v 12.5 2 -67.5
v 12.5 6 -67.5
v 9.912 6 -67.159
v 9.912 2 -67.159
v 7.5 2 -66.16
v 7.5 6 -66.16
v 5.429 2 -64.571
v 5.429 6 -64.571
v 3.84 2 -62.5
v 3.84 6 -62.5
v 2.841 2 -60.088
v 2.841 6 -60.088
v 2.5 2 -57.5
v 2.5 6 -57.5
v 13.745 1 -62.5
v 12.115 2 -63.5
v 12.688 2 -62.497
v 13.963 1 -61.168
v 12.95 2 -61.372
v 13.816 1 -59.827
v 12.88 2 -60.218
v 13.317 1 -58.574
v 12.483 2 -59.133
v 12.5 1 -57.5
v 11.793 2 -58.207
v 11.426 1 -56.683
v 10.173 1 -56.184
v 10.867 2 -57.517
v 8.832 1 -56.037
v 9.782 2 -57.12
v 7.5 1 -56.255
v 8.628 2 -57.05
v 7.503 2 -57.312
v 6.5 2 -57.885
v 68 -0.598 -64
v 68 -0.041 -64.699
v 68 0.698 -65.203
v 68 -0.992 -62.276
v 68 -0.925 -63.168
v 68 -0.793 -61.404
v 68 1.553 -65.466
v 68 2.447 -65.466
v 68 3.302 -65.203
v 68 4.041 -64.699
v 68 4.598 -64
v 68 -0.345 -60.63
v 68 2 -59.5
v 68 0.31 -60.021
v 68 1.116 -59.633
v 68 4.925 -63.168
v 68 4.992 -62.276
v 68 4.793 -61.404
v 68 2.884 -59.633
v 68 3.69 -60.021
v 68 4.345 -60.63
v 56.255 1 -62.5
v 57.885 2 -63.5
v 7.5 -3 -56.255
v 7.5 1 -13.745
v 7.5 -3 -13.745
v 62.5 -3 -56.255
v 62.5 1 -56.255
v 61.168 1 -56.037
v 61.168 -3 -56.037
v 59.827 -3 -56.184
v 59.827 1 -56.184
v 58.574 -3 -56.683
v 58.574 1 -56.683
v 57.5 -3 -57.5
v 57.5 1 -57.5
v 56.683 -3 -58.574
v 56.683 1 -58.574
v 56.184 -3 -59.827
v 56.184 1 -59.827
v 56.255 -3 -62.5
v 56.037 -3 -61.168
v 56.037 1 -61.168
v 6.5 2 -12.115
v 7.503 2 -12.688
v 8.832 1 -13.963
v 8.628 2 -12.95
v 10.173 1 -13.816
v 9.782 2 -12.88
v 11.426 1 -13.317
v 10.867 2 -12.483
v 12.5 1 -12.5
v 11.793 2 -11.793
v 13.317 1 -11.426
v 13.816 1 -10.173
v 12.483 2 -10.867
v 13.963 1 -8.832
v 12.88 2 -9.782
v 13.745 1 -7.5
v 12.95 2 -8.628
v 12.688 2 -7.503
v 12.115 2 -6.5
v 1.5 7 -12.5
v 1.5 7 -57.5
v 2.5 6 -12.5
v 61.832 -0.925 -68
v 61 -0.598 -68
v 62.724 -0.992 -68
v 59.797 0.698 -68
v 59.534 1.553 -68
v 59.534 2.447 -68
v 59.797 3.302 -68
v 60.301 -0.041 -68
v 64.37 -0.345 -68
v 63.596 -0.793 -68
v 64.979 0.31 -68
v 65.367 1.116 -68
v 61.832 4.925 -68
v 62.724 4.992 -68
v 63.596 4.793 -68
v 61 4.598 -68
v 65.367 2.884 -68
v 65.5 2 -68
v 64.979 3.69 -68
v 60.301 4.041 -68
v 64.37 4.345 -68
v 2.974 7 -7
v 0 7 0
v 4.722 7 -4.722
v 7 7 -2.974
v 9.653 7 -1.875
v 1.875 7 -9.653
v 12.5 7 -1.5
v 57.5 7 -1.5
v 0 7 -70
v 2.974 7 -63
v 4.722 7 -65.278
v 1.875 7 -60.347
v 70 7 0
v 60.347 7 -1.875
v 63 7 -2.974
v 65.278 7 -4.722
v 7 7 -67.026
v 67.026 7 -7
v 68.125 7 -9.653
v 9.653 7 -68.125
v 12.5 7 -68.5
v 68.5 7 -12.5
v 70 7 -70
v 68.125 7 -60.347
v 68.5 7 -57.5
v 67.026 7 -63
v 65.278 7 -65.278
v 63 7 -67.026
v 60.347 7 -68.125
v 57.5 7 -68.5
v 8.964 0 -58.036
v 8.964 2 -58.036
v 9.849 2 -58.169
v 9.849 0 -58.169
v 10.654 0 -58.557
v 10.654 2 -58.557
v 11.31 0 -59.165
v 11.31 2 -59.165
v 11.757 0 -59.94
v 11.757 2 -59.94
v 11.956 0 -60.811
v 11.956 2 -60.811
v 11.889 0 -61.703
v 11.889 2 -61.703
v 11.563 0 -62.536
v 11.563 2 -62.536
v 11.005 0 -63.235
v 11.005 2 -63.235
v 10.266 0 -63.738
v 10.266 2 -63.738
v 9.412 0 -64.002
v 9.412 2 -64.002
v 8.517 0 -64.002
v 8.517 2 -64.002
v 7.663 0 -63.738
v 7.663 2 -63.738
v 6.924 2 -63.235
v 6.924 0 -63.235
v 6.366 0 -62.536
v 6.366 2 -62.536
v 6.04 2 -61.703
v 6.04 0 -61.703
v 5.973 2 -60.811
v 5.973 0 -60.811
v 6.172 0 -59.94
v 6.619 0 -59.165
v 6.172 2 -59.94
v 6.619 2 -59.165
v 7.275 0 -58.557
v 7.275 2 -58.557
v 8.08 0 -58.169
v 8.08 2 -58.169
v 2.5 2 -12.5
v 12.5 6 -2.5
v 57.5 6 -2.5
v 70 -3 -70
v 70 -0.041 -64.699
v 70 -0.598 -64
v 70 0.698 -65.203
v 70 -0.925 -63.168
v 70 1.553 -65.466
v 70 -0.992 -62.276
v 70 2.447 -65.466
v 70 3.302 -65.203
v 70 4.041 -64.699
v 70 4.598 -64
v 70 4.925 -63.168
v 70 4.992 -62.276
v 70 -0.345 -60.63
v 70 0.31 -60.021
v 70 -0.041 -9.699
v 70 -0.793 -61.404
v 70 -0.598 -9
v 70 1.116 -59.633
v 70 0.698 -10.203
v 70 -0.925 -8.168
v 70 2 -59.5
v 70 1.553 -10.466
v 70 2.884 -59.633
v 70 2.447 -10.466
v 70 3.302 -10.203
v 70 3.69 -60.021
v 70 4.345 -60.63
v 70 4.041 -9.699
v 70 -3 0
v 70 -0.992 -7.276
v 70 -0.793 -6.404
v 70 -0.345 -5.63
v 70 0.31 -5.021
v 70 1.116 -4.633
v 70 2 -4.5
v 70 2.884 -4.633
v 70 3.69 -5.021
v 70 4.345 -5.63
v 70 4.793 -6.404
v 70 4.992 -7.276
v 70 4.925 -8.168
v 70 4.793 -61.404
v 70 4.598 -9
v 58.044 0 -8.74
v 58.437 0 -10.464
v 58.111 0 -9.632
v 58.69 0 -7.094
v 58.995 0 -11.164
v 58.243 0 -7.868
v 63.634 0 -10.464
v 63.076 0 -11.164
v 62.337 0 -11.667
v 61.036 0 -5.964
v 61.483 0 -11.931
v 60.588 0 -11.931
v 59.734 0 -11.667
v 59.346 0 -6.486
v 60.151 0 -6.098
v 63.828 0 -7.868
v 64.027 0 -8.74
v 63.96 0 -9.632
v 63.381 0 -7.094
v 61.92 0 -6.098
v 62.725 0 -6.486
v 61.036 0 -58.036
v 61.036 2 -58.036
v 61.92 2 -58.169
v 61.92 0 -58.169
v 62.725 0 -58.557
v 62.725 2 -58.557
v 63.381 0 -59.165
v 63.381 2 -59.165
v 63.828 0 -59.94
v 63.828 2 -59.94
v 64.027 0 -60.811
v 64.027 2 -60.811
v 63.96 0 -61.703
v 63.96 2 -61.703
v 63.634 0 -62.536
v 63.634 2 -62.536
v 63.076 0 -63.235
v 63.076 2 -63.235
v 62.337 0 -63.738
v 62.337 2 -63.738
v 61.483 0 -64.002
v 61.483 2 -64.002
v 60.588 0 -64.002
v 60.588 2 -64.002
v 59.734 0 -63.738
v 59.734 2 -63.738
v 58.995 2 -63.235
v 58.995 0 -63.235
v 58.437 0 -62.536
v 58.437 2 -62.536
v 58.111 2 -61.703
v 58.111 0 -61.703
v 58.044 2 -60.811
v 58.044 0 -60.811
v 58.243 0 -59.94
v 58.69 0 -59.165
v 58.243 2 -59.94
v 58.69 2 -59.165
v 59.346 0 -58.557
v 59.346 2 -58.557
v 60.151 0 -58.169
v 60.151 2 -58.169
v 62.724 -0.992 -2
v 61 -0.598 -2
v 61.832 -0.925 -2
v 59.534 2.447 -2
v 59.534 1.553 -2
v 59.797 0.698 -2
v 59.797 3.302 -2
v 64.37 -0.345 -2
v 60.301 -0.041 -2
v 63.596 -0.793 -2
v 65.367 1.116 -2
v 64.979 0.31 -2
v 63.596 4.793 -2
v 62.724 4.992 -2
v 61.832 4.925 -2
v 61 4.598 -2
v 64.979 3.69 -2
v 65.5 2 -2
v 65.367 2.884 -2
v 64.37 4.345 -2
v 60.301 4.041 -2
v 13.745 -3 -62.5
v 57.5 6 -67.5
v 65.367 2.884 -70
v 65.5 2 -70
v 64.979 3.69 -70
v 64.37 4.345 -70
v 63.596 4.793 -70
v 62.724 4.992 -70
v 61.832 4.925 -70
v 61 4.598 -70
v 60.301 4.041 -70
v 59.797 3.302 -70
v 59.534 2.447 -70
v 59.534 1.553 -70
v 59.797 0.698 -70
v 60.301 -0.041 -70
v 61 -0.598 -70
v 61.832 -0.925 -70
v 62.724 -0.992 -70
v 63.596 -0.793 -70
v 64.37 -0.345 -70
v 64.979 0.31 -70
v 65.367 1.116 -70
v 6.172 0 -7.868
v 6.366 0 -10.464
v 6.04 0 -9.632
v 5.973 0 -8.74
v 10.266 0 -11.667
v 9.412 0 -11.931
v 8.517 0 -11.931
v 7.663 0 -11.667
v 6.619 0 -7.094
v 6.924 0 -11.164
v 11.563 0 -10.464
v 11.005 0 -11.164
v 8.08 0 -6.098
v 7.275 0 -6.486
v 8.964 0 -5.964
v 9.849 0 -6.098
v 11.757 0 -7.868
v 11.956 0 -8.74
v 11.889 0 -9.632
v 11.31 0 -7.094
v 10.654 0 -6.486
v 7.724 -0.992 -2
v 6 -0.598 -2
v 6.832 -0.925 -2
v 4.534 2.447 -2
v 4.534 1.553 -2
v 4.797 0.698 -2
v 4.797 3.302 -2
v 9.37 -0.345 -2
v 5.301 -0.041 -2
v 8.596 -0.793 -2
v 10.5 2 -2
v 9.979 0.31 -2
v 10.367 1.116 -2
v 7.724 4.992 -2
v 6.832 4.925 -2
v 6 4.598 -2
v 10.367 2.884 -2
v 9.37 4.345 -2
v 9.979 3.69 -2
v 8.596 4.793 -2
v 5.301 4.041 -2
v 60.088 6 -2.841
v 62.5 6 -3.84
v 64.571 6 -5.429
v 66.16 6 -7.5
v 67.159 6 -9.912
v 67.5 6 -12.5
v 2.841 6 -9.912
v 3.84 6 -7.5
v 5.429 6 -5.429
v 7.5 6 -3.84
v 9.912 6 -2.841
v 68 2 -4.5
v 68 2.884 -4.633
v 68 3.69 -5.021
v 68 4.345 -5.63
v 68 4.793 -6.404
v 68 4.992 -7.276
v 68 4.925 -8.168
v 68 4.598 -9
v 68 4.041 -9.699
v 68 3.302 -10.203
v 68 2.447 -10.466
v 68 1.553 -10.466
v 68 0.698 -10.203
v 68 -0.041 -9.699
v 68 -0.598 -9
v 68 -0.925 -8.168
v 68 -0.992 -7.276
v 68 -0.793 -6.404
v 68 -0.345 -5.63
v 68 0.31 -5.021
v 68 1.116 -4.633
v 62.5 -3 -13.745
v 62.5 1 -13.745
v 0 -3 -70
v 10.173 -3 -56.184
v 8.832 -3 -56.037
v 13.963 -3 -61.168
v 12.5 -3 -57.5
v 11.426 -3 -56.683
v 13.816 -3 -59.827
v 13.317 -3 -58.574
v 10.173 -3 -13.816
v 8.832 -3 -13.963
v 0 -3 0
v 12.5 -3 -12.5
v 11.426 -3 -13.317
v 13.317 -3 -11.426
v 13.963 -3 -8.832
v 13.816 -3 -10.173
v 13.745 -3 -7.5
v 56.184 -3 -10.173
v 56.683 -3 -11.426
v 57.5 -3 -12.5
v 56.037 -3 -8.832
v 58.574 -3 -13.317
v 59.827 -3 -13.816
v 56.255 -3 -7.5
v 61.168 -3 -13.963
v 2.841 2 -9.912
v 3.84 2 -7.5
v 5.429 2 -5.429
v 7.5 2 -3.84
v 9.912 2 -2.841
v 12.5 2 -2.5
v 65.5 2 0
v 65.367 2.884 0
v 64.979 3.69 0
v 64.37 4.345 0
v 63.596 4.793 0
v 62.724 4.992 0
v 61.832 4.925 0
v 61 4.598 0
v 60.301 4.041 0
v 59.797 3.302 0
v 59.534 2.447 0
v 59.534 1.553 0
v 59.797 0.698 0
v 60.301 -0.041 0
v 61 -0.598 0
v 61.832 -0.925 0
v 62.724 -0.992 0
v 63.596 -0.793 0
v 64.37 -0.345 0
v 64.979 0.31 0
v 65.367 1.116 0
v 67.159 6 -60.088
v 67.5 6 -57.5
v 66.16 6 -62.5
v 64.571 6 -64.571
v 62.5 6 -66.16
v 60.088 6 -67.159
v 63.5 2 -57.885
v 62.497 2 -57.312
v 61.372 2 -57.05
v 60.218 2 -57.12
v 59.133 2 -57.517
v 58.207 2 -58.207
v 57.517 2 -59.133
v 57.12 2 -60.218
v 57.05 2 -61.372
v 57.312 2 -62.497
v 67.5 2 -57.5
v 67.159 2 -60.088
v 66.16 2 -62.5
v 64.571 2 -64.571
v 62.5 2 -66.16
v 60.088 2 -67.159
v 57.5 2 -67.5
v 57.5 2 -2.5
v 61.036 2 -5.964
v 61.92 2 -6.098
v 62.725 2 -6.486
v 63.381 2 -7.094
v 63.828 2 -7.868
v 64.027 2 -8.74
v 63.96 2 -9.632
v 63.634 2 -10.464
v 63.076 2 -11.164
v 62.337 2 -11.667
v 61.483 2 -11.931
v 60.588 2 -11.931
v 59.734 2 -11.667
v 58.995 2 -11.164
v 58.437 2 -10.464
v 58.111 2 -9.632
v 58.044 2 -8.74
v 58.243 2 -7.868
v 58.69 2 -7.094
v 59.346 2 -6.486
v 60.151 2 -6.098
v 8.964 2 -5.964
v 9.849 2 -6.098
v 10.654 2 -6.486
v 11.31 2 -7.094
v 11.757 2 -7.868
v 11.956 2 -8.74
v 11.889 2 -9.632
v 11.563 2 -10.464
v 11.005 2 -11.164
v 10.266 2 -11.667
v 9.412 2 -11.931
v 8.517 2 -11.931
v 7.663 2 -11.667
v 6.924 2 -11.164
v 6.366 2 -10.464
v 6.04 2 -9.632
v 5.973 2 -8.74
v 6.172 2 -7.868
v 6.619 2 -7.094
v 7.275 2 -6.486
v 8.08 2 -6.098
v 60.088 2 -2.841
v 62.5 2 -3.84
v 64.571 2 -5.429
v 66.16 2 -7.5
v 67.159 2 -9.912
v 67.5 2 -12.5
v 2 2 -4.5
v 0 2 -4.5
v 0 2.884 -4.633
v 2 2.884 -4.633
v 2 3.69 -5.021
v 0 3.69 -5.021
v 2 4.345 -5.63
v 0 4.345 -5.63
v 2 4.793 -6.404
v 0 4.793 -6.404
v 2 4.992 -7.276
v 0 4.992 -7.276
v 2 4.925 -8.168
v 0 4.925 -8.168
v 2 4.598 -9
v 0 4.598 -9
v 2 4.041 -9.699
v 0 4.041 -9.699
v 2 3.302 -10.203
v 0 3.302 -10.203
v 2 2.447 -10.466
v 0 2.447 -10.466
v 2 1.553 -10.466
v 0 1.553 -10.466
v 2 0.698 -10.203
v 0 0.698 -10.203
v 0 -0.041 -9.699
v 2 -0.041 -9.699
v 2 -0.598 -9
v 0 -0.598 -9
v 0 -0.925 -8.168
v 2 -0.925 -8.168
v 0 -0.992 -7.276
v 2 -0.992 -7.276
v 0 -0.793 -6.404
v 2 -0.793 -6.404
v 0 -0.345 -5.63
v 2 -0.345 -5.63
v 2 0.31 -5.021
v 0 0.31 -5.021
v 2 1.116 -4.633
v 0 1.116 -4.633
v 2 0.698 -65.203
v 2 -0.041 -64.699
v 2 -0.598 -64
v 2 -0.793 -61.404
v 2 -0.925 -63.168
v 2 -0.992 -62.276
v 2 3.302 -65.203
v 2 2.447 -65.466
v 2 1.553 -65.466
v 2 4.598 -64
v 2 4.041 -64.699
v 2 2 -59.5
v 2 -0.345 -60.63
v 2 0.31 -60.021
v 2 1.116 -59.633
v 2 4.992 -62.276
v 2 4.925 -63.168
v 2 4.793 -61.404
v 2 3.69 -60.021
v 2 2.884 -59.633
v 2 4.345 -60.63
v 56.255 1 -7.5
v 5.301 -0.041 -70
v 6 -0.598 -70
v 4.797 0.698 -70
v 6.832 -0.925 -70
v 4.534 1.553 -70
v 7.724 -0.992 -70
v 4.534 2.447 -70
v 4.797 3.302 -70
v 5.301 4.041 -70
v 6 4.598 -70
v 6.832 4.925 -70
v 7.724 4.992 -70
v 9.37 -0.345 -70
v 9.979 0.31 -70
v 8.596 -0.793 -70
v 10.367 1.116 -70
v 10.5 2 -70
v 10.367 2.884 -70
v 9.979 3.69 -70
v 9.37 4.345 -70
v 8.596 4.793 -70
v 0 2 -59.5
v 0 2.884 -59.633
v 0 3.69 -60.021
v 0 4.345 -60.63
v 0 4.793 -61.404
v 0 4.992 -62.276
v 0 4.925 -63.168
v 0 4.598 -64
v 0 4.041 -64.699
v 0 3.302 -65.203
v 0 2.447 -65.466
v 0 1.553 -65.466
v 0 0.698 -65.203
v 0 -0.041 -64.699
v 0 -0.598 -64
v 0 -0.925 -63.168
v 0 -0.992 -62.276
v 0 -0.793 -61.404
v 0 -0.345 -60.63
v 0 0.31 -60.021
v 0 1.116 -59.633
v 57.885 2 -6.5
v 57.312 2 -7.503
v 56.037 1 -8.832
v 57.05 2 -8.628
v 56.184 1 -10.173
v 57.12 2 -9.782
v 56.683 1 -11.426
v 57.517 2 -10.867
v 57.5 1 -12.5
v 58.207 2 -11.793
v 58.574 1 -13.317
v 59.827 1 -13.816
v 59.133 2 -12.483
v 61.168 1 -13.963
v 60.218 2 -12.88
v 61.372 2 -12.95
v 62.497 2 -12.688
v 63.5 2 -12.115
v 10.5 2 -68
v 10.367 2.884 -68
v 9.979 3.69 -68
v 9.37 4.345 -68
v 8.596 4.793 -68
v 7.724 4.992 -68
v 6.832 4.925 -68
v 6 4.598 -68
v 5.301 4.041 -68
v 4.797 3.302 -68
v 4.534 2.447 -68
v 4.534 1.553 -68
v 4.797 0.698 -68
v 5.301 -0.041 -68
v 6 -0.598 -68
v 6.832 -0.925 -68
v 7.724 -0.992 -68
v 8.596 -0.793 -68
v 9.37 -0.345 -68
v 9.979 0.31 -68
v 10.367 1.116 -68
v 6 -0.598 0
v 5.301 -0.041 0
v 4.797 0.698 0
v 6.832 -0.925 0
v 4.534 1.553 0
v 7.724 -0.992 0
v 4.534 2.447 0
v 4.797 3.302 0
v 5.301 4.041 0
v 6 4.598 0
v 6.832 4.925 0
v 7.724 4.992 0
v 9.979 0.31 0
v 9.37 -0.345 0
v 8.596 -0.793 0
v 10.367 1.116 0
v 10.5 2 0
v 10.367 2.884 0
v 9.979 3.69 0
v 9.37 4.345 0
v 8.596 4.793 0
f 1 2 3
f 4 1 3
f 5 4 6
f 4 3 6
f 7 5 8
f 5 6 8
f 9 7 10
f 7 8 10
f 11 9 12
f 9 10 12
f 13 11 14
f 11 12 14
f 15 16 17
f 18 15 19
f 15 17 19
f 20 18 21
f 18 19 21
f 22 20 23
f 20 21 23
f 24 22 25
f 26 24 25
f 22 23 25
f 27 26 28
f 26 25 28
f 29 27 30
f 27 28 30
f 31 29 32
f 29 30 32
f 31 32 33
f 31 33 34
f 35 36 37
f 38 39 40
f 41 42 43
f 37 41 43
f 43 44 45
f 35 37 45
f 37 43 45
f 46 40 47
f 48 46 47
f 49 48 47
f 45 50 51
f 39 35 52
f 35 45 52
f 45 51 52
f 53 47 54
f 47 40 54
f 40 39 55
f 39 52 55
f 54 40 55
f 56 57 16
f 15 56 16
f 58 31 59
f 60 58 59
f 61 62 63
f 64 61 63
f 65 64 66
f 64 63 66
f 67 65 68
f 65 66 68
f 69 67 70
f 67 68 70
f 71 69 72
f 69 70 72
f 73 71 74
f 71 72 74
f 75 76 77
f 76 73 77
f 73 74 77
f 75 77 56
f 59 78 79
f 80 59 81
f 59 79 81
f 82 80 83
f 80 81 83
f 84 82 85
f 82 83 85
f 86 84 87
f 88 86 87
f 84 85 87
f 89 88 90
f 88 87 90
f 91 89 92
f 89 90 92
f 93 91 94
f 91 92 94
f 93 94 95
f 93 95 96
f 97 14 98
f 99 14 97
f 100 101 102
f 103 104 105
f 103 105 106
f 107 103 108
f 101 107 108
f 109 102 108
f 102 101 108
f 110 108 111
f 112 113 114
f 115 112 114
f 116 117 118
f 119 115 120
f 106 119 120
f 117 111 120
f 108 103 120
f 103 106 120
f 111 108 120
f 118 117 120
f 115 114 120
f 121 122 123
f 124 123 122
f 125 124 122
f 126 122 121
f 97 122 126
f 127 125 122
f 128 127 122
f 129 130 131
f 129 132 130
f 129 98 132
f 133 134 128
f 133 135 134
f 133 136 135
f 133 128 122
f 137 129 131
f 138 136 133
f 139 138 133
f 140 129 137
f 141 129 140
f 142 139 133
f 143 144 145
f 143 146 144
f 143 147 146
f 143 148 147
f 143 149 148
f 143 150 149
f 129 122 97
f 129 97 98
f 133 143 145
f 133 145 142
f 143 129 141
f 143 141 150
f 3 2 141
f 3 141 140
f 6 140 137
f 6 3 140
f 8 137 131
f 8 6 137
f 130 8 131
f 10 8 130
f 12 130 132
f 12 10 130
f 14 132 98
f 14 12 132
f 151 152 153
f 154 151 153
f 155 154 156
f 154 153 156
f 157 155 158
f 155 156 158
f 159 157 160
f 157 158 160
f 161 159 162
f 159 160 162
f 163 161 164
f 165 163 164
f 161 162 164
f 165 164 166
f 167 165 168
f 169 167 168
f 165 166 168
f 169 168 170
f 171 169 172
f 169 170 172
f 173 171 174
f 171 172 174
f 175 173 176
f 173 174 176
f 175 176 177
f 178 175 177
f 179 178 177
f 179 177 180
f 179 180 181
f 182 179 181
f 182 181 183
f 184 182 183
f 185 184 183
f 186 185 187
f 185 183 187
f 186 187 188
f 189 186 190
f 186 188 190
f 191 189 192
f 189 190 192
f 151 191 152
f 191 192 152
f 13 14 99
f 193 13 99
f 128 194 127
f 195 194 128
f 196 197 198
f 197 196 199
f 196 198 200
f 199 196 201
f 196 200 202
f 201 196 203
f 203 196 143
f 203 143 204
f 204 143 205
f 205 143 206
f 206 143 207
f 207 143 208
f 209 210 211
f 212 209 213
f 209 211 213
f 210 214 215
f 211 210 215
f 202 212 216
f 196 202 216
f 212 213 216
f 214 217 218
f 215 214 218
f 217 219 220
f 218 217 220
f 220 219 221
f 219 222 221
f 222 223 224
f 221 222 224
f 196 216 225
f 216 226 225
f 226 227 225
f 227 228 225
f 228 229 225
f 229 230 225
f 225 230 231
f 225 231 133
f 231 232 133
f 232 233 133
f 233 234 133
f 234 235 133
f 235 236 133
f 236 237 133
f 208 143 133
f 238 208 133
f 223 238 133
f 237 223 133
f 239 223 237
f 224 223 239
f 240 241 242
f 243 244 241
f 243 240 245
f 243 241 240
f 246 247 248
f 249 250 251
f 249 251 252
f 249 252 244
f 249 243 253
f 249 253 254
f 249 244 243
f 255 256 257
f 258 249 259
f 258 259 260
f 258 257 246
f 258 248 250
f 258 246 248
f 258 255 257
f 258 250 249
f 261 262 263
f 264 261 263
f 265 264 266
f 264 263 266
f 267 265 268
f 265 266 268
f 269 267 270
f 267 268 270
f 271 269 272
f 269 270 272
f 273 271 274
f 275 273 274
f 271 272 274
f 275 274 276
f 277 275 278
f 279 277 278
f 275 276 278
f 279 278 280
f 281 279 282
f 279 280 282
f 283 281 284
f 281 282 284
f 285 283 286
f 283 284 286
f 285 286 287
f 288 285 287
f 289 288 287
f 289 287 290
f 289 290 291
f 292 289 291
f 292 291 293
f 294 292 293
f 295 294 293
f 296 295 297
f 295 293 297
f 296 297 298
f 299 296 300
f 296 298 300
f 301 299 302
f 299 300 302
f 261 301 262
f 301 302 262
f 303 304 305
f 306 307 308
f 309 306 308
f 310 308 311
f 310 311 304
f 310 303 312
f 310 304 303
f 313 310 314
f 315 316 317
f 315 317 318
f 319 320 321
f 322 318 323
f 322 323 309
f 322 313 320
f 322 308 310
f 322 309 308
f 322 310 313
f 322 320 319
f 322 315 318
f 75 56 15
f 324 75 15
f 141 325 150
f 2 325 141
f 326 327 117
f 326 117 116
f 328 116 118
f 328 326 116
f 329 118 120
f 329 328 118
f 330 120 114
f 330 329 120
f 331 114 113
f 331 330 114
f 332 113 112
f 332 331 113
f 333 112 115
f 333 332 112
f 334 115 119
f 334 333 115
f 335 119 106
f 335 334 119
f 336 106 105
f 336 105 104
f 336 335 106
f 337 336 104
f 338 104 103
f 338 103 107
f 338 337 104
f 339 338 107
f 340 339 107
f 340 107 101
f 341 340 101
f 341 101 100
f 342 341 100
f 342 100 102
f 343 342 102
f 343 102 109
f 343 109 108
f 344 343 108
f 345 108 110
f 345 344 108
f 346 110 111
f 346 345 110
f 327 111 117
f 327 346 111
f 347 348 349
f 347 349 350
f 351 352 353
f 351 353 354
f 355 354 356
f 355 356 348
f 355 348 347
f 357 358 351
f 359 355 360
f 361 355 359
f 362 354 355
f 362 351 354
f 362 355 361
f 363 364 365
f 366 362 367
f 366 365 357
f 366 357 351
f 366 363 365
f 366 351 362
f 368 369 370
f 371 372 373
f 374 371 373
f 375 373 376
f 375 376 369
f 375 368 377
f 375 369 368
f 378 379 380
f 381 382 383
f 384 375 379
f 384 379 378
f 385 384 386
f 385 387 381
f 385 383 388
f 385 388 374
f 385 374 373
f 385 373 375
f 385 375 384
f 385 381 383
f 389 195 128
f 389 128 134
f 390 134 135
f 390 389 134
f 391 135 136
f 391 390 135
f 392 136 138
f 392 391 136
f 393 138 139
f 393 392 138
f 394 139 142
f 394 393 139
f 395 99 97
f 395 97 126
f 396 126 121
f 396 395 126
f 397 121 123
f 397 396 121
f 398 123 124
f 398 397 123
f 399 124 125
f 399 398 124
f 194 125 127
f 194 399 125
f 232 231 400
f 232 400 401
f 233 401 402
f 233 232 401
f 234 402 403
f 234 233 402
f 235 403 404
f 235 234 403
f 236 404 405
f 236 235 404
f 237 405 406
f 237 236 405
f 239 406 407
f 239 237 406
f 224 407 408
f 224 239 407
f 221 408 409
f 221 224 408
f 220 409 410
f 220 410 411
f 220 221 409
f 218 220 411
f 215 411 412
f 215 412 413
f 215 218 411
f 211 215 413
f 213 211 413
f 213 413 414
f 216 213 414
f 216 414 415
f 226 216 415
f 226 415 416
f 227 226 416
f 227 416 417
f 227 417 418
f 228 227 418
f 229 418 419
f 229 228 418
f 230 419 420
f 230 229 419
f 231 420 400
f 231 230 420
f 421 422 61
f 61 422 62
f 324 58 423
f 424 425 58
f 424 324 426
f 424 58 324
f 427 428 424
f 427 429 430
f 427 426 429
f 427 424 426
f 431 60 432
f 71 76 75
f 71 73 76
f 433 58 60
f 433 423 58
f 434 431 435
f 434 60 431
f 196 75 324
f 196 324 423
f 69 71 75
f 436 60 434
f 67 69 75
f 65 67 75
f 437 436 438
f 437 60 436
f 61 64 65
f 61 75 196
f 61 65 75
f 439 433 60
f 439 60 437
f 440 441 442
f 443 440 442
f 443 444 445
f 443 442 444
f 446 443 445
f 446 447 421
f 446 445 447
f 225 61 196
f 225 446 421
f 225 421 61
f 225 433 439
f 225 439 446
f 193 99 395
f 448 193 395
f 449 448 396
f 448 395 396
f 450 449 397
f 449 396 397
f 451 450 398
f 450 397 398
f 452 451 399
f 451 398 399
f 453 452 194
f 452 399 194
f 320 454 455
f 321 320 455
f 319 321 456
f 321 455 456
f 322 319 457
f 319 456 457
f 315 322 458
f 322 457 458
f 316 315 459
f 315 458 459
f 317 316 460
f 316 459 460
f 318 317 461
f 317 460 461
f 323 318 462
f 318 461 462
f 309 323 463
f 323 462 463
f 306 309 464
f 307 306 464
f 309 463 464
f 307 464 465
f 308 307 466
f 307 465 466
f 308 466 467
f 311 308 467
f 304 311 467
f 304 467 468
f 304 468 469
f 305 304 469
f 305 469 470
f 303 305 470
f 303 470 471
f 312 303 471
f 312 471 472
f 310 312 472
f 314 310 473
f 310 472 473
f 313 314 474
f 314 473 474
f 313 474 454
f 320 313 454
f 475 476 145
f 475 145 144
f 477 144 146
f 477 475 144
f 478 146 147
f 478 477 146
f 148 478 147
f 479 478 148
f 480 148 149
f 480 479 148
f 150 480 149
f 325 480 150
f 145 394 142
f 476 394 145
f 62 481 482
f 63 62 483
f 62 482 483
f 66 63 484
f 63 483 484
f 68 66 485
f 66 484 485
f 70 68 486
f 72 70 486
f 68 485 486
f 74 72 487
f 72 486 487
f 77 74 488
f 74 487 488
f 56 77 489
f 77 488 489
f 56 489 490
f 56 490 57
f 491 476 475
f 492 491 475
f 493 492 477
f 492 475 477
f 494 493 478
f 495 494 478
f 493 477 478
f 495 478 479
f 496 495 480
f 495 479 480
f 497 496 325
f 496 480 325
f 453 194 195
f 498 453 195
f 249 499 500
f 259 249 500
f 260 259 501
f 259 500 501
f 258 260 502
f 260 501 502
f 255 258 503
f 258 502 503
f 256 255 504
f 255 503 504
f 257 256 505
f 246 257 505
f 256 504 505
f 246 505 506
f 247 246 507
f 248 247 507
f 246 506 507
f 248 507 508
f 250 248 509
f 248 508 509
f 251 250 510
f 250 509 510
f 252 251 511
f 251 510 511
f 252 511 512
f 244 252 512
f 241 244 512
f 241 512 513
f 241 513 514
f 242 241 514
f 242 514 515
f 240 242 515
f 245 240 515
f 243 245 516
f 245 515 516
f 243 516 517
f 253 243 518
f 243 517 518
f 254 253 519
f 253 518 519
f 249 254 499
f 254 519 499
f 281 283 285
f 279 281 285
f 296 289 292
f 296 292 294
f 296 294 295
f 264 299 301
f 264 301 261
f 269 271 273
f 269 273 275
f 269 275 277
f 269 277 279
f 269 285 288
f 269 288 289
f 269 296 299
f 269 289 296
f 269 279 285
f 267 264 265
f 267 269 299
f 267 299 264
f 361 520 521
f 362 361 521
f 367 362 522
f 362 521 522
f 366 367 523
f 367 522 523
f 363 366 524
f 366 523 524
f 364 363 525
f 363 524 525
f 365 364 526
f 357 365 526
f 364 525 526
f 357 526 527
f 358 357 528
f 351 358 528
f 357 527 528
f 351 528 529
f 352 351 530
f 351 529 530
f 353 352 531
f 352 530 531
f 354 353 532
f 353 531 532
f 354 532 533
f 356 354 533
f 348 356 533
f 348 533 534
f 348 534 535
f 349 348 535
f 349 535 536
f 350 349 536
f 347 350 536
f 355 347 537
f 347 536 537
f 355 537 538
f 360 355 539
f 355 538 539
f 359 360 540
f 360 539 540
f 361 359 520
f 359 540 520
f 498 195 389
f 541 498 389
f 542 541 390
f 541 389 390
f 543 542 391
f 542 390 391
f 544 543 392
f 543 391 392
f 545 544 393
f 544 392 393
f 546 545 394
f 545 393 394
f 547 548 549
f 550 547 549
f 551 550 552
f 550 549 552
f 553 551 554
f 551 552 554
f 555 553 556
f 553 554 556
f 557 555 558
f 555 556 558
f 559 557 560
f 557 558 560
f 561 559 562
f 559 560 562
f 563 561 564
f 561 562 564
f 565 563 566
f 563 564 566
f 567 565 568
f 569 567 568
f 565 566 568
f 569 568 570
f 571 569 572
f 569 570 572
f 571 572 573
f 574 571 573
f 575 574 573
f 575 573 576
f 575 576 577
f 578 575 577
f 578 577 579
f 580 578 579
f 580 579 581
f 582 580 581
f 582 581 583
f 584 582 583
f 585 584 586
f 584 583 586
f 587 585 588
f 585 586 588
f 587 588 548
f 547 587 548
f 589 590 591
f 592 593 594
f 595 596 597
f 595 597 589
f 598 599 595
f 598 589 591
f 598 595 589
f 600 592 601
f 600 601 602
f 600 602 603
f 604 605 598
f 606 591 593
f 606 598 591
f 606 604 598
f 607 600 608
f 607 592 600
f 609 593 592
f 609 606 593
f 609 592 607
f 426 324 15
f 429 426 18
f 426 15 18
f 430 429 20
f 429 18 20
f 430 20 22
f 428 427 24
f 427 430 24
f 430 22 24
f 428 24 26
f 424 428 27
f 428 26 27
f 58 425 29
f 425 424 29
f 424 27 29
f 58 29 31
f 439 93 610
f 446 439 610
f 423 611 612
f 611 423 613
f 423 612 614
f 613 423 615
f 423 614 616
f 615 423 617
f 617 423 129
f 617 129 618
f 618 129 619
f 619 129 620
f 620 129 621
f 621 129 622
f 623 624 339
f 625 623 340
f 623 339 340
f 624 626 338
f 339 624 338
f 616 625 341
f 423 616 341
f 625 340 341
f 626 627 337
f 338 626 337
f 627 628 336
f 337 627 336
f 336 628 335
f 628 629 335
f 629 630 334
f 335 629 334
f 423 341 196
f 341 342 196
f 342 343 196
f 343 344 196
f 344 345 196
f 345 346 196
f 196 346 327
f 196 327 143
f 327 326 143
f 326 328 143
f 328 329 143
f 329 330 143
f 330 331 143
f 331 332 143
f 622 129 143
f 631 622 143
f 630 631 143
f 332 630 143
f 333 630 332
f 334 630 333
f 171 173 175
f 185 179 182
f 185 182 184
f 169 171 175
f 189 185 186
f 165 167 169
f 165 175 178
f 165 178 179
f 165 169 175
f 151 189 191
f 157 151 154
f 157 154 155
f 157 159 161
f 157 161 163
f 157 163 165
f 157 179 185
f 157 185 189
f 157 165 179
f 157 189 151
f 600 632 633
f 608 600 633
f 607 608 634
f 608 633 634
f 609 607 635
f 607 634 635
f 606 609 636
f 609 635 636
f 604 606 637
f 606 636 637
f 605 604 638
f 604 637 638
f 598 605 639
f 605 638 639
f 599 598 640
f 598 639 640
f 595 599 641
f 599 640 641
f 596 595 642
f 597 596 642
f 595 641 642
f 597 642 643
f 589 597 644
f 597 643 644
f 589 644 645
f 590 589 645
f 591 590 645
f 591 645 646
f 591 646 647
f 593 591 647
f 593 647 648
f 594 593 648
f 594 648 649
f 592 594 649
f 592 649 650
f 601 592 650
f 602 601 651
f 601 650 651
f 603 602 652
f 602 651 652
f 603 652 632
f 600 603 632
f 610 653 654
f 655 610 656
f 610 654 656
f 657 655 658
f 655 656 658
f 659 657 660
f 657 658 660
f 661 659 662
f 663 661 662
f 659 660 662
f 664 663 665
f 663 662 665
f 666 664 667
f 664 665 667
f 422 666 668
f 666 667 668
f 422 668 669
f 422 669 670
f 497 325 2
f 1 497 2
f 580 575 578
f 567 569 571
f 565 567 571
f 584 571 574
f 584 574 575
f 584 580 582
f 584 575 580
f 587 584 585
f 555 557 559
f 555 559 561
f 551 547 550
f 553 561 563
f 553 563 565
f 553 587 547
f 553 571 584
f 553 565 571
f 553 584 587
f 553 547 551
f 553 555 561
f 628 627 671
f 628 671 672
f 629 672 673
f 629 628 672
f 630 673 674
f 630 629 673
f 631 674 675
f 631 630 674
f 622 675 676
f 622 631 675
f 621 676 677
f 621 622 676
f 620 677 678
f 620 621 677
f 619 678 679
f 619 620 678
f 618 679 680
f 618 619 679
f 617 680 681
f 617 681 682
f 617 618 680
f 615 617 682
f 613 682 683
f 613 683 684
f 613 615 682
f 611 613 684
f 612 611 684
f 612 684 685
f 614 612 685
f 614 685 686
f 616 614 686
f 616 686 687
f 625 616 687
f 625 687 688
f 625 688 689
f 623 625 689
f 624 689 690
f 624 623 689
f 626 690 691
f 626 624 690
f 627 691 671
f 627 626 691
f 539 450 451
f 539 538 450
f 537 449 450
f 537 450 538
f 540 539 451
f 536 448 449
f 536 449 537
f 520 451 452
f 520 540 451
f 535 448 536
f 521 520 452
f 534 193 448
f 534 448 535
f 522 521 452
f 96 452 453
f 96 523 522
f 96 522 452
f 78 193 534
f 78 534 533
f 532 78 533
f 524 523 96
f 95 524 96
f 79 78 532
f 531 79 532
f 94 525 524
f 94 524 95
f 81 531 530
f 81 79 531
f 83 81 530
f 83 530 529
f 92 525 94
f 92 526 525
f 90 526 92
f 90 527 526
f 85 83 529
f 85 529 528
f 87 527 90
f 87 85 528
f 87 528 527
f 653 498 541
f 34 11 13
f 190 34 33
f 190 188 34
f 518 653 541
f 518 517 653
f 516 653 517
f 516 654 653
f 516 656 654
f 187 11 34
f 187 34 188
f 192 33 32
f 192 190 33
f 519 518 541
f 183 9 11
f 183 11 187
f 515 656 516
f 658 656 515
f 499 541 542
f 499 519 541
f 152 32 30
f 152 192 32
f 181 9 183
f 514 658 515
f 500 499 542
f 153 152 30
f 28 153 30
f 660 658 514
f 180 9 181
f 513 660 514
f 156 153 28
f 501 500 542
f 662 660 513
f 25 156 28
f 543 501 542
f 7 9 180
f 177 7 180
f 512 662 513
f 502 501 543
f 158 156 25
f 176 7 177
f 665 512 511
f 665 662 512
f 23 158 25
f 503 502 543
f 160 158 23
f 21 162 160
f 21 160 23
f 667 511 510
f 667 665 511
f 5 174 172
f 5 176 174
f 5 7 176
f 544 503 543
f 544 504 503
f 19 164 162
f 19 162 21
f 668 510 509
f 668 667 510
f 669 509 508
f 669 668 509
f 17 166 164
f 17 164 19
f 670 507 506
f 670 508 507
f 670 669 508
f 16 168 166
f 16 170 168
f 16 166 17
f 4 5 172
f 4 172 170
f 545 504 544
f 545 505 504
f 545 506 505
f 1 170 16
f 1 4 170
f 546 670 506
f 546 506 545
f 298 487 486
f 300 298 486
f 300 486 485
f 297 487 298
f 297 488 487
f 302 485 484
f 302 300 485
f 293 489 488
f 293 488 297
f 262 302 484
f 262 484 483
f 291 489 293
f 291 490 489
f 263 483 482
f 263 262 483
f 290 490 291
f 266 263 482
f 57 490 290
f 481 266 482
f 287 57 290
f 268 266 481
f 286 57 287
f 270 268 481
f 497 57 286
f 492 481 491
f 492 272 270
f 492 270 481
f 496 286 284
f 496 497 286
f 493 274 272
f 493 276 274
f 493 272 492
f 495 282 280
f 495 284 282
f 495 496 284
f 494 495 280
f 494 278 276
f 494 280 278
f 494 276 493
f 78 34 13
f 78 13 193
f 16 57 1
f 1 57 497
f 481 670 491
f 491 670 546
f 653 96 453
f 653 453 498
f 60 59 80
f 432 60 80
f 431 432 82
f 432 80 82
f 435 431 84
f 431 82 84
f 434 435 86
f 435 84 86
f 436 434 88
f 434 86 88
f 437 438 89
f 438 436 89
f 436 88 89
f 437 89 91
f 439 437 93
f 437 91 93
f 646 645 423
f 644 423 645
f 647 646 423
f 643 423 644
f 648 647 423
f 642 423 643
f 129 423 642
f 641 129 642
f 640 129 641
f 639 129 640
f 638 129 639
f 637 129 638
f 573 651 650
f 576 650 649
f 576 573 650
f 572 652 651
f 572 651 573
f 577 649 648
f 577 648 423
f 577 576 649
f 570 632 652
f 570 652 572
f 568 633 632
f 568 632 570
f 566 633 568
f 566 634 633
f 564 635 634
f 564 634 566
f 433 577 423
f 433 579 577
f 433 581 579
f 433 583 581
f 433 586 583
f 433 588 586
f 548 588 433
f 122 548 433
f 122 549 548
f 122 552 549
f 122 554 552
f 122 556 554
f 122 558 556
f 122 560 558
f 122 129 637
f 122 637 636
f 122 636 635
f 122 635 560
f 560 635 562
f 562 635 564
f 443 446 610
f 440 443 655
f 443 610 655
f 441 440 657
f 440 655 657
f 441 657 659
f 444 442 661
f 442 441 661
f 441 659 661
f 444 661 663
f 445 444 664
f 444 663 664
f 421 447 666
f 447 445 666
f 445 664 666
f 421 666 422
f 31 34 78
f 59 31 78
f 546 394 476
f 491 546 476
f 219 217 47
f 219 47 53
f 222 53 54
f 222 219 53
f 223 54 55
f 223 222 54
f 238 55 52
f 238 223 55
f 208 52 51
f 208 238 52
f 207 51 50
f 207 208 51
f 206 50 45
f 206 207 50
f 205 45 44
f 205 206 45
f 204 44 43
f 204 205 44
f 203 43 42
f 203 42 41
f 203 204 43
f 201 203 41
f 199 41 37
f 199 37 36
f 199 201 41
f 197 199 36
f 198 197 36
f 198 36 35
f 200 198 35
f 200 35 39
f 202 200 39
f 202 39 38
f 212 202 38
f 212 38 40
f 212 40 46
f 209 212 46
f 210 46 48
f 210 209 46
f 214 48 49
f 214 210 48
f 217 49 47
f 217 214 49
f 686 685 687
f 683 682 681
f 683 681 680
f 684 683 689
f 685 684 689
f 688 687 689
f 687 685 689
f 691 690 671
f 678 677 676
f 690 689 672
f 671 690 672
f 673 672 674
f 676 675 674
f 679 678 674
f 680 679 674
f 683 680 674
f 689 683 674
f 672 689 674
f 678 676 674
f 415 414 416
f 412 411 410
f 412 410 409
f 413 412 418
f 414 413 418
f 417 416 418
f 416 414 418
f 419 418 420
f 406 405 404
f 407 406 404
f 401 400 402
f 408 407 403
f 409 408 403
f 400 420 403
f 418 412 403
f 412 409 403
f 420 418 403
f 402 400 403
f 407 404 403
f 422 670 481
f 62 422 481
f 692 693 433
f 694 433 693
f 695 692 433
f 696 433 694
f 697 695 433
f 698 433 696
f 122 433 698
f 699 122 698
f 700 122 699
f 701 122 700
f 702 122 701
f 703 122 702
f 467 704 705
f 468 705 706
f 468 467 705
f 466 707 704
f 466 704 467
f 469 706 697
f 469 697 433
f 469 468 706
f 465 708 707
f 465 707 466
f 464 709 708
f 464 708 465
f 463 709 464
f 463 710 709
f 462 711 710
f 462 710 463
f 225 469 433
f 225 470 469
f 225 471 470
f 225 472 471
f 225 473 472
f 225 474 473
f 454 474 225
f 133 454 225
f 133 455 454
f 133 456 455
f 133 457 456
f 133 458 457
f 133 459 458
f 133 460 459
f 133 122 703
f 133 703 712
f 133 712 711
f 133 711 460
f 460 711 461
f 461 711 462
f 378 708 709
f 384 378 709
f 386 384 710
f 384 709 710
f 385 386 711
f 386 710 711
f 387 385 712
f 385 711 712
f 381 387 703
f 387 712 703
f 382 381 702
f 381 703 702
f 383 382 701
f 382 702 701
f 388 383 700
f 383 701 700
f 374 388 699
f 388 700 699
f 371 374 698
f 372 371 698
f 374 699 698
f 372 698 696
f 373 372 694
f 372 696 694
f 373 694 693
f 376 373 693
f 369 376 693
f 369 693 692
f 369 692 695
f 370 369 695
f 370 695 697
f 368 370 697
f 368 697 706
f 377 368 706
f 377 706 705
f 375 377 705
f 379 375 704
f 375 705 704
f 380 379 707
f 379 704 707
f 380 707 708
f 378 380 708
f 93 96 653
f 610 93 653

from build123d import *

# Parameters (mm, degrees)
SKETCH1_W           = 70
SKETCH1_H           = 70
BOSS_EXTRUDE2_DEPTH = 7
CUT_EXTRUDE1_DEPTH  = 5
SKETCH9_W           = 70
SKETCH9_H           = 70
BOSS_EXTRUDE3_DEPTH = 5
CUT_EXTRUDE11_DEPTH = 100.242128151
SKETCH21_R          = 3
CUT_EXTRUDE12_DEPTH = 2
CHAMFER3_SIZE       = 1
CUT_EXTRUDE13_START = -2
SKETCH22_W          = 70
SKETCH22_H          = 70
CUT_EXTRUDE13_DEPTH = 2
SKETCH27_R          = 3
CUT_EXTRUDE27_DEPTH = 2
SKETCH28_R          = 3
CUT_EXTRUDE28_DEPTH = 2


with BuildPart() as part:
    # Sketch1 → Boss-Extrude2 (new body)
    with BuildSketch(Plane(origin=(0, 0, 0), x_dir=(1, 0, 0), z_dir=(0, 1, 0))):
        with Locations((35, 35)):
            Rectangle(SKETCH1_W, SKETCH1_H)
    extrude(amount=BOSS_EXTRUDE2_DEPTH)

    # Sketch3 → Cut-Extrude1 (cut)
    with BuildSketch(Plane(origin=(0, 7, 0), x_dir=(1, 0, 0), z_dir=(0, 1, 0))):
        with BuildLine():
            Line((2.5, 57.5), (2.5, 12.5))
            ThreePointArc((2.5, 12.5), (5.428932188, 5.428932188), (12.5, 2.5))
            Line((12.5, 2.5), (57.5, 2.5))
            ThreePointArc((57.5, 2.5), (64.571067812, 5.428932188), (67.5, 12.5))
            Line((67.5, 12.5), (67.5, 57.5))
            ThreePointArc((67.5, 57.5), (64.571067812, 64.571067812), (57.5, 67.5))
            Line((57.5, 67.5), (12.5, 67.5))
            ThreePointArc((12.5, 67.5), (5.428932188, 64.571067812), (2.5, 57.5))
        make_face()
    extrude(amount=-CUT_EXTRUDE1_DEPTH, mode=Mode.SUBTRACT)

    # Sketch9 → Boss-Extrude3 (add)
    with BuildSketch(Plane.XZ):
        with Locations((35, -35)):
            Rectangle(SKETCH9_W, SKETCH9_H)
    extrude(amount=BOSS_EXTRUDE3_DEPTH)

    # Sketch20 → Cut-Extrude11 (cut, through all)
    with BuildSketch(Plane(origin=(0, 2, 0), x_dir=(1, 0, 0), z_dir=(0, 1, 0))):
        with BuildLine():
            Line((13.745191882, 7.5), (56.254808118, 7.5))
            ThreePointArc((56.254808118, 7.5), (57.5, 12.5), (62.5, 13.745191882))
            Line((62.5, 13.745191882), (62.5, 56.254808118))
            ThreePointArc((62.5, 56.254808118), (57.5, 57.5), (56.254808118, 62.5))
            Line((56.254808118, 62.5), (13.745191882, 62.5))
            ThreePointArc((13.745191882, 62.5), (12.5, 57.5), (7.5, 56.254808118))
            Line((7.5, 56.254808118), (7.5, 13.745191882))
            ThreePointArc((7.5, 13.745191882), (12.5, 12.5), (13.745191882, 7.5))
        make_face()
    extrude(amount=-CUT_EXTRUDE11_DEPTH, mode=Mode.SUBTRACT)

    # Sketch21 → Cut-Extrude12 (cut)
    with BuildSketch(Plane(origin=(0, 2, 0), x_dir=(1, 0, 0), z_dir=(0, 1, 0))):
        with Locations(Location((8.964466094, 61.035533906, 0), (0, 0, 270))):
            Circle(SKETCH21_R)
        with Locations(Location((61.035533906, 61.035533906, 0), (0, 0, 270))):
            Circle(SKETCH21_R)
        with Locations(Location((61.035533906, 8.964466094, 0), (0, 0, 270))):
            Circle(SKETCH21_R)
        with Locations(Location((8.964466094, 8.964466094, 0), (0, 0, 270))):
            Circle(SKETCH21_R)
    extrude(amount=-CUT_EXTRUDE12_DEPTH, mode=Mode.SUBTRACT)

    # Chamfer3
    chamfer3_edges = [part.edges().sort_by_distance(p)[0] for p in [
        (5.428932188, 7, -5.428932188),
        (35, 7, -2.5),
        (64.571067812, 7, -5.428932188),
        (67.5, 7, -35),
        (64.571067812, 7, -64.571067812),
        (35, 7, -67.5),
        (5.428932188, 7, -64.571067812),
        (2.5, 7, -35),
        (12.5, 2, -12.5),
        (12.5, 2, -57.5),
        (57.5, 2, -57.5),
        (57.5, 2, -12.5),
        (35, 2, -7.5),
        (62.5, 2, -35),
        (35, 2, -62.5),
        (7.5, 2, -35),
    ]]
    chamfer(chamfer3_edges, length=CHAMFER3_SIZE)

    # Sketch22 → Cut-Extrude13 (cut)
    with BuildSketch(Plane.XZ.offset(5).offset(CUT_EXTRUDE13_START)):
        with Locations((35, -35)):
            Rectangle(SKETCH22_W, SKETCH22_H)
        with BuildLine():
            Line((7.5, -13.745191882), (7.5, -56.254808118))
            ThreePointArc((7.5, -56.254808118), (12.5, -57.5), (13.745191882, -62.5))
            Line((13.745191882, -62.5), (56.254808118, -62.5))
            ThreePointArc((56.254808118, -62.5), (57.5, -57.5), (62.5, -56.254808118))
            Line((62.5, -56.254808118), (62.5, -13.745191882))
            ThreePointArc((62.5, -13.745191882), (57.5, -12.5), (56.254808118, -7.5))
            Line((56.254808118, -7.5), (13.745191882, -7.5))
            ThreePointArc((13.745191882, -7.5), (12.5, -12.5), (7.5, -13.745191882))
        make_face(mode=Mode.SUBTRACT)
    extrude(amount=CUT_EXTRUDE13_DEPTH, mode=Mode.SUBTRACT)

    # Sketch27 → Cut-Extrude27 (cut)
    with BuildSketch(Plane.ZY):
        with Locations((-62.5, 2)):
            Circle(SKETCH27_R)
        with Locations((-7.5, 2)):
            Circle(SKETCH27_R)
    cut_extrude27 = extrude(amount=-CUT_EXTRUDE27_DEPTH, mode=Mode.SUBTRACT)

    # Mirror4: Cut-Extrude27 across plane
    add(cut_extrude27.mirror(Plane.ZY.offset(-35)), mode=Mode.SUBTRACT)

    # Sketch28 → Cut-Extrude28 (cut)
    with BuildSketch(Plane.XY):
        with Locations((7.5, 2)):
            Circle(SKETCH28_R)
        with Locations((62.5, 2)):
            Circle(SKETCH28_R)
    cut_extrude28 = extrude(amount=-CUT_EXTRUDE28_DEPTH, mode=Mode.SUBTRACT)

    # Mirror5: Cut-Extrude28 across plane
    add(cut_extrude28.mirror(Plane.XY.offset(-35)), mode=Mode.SUBTRACT)


solid = part.part
